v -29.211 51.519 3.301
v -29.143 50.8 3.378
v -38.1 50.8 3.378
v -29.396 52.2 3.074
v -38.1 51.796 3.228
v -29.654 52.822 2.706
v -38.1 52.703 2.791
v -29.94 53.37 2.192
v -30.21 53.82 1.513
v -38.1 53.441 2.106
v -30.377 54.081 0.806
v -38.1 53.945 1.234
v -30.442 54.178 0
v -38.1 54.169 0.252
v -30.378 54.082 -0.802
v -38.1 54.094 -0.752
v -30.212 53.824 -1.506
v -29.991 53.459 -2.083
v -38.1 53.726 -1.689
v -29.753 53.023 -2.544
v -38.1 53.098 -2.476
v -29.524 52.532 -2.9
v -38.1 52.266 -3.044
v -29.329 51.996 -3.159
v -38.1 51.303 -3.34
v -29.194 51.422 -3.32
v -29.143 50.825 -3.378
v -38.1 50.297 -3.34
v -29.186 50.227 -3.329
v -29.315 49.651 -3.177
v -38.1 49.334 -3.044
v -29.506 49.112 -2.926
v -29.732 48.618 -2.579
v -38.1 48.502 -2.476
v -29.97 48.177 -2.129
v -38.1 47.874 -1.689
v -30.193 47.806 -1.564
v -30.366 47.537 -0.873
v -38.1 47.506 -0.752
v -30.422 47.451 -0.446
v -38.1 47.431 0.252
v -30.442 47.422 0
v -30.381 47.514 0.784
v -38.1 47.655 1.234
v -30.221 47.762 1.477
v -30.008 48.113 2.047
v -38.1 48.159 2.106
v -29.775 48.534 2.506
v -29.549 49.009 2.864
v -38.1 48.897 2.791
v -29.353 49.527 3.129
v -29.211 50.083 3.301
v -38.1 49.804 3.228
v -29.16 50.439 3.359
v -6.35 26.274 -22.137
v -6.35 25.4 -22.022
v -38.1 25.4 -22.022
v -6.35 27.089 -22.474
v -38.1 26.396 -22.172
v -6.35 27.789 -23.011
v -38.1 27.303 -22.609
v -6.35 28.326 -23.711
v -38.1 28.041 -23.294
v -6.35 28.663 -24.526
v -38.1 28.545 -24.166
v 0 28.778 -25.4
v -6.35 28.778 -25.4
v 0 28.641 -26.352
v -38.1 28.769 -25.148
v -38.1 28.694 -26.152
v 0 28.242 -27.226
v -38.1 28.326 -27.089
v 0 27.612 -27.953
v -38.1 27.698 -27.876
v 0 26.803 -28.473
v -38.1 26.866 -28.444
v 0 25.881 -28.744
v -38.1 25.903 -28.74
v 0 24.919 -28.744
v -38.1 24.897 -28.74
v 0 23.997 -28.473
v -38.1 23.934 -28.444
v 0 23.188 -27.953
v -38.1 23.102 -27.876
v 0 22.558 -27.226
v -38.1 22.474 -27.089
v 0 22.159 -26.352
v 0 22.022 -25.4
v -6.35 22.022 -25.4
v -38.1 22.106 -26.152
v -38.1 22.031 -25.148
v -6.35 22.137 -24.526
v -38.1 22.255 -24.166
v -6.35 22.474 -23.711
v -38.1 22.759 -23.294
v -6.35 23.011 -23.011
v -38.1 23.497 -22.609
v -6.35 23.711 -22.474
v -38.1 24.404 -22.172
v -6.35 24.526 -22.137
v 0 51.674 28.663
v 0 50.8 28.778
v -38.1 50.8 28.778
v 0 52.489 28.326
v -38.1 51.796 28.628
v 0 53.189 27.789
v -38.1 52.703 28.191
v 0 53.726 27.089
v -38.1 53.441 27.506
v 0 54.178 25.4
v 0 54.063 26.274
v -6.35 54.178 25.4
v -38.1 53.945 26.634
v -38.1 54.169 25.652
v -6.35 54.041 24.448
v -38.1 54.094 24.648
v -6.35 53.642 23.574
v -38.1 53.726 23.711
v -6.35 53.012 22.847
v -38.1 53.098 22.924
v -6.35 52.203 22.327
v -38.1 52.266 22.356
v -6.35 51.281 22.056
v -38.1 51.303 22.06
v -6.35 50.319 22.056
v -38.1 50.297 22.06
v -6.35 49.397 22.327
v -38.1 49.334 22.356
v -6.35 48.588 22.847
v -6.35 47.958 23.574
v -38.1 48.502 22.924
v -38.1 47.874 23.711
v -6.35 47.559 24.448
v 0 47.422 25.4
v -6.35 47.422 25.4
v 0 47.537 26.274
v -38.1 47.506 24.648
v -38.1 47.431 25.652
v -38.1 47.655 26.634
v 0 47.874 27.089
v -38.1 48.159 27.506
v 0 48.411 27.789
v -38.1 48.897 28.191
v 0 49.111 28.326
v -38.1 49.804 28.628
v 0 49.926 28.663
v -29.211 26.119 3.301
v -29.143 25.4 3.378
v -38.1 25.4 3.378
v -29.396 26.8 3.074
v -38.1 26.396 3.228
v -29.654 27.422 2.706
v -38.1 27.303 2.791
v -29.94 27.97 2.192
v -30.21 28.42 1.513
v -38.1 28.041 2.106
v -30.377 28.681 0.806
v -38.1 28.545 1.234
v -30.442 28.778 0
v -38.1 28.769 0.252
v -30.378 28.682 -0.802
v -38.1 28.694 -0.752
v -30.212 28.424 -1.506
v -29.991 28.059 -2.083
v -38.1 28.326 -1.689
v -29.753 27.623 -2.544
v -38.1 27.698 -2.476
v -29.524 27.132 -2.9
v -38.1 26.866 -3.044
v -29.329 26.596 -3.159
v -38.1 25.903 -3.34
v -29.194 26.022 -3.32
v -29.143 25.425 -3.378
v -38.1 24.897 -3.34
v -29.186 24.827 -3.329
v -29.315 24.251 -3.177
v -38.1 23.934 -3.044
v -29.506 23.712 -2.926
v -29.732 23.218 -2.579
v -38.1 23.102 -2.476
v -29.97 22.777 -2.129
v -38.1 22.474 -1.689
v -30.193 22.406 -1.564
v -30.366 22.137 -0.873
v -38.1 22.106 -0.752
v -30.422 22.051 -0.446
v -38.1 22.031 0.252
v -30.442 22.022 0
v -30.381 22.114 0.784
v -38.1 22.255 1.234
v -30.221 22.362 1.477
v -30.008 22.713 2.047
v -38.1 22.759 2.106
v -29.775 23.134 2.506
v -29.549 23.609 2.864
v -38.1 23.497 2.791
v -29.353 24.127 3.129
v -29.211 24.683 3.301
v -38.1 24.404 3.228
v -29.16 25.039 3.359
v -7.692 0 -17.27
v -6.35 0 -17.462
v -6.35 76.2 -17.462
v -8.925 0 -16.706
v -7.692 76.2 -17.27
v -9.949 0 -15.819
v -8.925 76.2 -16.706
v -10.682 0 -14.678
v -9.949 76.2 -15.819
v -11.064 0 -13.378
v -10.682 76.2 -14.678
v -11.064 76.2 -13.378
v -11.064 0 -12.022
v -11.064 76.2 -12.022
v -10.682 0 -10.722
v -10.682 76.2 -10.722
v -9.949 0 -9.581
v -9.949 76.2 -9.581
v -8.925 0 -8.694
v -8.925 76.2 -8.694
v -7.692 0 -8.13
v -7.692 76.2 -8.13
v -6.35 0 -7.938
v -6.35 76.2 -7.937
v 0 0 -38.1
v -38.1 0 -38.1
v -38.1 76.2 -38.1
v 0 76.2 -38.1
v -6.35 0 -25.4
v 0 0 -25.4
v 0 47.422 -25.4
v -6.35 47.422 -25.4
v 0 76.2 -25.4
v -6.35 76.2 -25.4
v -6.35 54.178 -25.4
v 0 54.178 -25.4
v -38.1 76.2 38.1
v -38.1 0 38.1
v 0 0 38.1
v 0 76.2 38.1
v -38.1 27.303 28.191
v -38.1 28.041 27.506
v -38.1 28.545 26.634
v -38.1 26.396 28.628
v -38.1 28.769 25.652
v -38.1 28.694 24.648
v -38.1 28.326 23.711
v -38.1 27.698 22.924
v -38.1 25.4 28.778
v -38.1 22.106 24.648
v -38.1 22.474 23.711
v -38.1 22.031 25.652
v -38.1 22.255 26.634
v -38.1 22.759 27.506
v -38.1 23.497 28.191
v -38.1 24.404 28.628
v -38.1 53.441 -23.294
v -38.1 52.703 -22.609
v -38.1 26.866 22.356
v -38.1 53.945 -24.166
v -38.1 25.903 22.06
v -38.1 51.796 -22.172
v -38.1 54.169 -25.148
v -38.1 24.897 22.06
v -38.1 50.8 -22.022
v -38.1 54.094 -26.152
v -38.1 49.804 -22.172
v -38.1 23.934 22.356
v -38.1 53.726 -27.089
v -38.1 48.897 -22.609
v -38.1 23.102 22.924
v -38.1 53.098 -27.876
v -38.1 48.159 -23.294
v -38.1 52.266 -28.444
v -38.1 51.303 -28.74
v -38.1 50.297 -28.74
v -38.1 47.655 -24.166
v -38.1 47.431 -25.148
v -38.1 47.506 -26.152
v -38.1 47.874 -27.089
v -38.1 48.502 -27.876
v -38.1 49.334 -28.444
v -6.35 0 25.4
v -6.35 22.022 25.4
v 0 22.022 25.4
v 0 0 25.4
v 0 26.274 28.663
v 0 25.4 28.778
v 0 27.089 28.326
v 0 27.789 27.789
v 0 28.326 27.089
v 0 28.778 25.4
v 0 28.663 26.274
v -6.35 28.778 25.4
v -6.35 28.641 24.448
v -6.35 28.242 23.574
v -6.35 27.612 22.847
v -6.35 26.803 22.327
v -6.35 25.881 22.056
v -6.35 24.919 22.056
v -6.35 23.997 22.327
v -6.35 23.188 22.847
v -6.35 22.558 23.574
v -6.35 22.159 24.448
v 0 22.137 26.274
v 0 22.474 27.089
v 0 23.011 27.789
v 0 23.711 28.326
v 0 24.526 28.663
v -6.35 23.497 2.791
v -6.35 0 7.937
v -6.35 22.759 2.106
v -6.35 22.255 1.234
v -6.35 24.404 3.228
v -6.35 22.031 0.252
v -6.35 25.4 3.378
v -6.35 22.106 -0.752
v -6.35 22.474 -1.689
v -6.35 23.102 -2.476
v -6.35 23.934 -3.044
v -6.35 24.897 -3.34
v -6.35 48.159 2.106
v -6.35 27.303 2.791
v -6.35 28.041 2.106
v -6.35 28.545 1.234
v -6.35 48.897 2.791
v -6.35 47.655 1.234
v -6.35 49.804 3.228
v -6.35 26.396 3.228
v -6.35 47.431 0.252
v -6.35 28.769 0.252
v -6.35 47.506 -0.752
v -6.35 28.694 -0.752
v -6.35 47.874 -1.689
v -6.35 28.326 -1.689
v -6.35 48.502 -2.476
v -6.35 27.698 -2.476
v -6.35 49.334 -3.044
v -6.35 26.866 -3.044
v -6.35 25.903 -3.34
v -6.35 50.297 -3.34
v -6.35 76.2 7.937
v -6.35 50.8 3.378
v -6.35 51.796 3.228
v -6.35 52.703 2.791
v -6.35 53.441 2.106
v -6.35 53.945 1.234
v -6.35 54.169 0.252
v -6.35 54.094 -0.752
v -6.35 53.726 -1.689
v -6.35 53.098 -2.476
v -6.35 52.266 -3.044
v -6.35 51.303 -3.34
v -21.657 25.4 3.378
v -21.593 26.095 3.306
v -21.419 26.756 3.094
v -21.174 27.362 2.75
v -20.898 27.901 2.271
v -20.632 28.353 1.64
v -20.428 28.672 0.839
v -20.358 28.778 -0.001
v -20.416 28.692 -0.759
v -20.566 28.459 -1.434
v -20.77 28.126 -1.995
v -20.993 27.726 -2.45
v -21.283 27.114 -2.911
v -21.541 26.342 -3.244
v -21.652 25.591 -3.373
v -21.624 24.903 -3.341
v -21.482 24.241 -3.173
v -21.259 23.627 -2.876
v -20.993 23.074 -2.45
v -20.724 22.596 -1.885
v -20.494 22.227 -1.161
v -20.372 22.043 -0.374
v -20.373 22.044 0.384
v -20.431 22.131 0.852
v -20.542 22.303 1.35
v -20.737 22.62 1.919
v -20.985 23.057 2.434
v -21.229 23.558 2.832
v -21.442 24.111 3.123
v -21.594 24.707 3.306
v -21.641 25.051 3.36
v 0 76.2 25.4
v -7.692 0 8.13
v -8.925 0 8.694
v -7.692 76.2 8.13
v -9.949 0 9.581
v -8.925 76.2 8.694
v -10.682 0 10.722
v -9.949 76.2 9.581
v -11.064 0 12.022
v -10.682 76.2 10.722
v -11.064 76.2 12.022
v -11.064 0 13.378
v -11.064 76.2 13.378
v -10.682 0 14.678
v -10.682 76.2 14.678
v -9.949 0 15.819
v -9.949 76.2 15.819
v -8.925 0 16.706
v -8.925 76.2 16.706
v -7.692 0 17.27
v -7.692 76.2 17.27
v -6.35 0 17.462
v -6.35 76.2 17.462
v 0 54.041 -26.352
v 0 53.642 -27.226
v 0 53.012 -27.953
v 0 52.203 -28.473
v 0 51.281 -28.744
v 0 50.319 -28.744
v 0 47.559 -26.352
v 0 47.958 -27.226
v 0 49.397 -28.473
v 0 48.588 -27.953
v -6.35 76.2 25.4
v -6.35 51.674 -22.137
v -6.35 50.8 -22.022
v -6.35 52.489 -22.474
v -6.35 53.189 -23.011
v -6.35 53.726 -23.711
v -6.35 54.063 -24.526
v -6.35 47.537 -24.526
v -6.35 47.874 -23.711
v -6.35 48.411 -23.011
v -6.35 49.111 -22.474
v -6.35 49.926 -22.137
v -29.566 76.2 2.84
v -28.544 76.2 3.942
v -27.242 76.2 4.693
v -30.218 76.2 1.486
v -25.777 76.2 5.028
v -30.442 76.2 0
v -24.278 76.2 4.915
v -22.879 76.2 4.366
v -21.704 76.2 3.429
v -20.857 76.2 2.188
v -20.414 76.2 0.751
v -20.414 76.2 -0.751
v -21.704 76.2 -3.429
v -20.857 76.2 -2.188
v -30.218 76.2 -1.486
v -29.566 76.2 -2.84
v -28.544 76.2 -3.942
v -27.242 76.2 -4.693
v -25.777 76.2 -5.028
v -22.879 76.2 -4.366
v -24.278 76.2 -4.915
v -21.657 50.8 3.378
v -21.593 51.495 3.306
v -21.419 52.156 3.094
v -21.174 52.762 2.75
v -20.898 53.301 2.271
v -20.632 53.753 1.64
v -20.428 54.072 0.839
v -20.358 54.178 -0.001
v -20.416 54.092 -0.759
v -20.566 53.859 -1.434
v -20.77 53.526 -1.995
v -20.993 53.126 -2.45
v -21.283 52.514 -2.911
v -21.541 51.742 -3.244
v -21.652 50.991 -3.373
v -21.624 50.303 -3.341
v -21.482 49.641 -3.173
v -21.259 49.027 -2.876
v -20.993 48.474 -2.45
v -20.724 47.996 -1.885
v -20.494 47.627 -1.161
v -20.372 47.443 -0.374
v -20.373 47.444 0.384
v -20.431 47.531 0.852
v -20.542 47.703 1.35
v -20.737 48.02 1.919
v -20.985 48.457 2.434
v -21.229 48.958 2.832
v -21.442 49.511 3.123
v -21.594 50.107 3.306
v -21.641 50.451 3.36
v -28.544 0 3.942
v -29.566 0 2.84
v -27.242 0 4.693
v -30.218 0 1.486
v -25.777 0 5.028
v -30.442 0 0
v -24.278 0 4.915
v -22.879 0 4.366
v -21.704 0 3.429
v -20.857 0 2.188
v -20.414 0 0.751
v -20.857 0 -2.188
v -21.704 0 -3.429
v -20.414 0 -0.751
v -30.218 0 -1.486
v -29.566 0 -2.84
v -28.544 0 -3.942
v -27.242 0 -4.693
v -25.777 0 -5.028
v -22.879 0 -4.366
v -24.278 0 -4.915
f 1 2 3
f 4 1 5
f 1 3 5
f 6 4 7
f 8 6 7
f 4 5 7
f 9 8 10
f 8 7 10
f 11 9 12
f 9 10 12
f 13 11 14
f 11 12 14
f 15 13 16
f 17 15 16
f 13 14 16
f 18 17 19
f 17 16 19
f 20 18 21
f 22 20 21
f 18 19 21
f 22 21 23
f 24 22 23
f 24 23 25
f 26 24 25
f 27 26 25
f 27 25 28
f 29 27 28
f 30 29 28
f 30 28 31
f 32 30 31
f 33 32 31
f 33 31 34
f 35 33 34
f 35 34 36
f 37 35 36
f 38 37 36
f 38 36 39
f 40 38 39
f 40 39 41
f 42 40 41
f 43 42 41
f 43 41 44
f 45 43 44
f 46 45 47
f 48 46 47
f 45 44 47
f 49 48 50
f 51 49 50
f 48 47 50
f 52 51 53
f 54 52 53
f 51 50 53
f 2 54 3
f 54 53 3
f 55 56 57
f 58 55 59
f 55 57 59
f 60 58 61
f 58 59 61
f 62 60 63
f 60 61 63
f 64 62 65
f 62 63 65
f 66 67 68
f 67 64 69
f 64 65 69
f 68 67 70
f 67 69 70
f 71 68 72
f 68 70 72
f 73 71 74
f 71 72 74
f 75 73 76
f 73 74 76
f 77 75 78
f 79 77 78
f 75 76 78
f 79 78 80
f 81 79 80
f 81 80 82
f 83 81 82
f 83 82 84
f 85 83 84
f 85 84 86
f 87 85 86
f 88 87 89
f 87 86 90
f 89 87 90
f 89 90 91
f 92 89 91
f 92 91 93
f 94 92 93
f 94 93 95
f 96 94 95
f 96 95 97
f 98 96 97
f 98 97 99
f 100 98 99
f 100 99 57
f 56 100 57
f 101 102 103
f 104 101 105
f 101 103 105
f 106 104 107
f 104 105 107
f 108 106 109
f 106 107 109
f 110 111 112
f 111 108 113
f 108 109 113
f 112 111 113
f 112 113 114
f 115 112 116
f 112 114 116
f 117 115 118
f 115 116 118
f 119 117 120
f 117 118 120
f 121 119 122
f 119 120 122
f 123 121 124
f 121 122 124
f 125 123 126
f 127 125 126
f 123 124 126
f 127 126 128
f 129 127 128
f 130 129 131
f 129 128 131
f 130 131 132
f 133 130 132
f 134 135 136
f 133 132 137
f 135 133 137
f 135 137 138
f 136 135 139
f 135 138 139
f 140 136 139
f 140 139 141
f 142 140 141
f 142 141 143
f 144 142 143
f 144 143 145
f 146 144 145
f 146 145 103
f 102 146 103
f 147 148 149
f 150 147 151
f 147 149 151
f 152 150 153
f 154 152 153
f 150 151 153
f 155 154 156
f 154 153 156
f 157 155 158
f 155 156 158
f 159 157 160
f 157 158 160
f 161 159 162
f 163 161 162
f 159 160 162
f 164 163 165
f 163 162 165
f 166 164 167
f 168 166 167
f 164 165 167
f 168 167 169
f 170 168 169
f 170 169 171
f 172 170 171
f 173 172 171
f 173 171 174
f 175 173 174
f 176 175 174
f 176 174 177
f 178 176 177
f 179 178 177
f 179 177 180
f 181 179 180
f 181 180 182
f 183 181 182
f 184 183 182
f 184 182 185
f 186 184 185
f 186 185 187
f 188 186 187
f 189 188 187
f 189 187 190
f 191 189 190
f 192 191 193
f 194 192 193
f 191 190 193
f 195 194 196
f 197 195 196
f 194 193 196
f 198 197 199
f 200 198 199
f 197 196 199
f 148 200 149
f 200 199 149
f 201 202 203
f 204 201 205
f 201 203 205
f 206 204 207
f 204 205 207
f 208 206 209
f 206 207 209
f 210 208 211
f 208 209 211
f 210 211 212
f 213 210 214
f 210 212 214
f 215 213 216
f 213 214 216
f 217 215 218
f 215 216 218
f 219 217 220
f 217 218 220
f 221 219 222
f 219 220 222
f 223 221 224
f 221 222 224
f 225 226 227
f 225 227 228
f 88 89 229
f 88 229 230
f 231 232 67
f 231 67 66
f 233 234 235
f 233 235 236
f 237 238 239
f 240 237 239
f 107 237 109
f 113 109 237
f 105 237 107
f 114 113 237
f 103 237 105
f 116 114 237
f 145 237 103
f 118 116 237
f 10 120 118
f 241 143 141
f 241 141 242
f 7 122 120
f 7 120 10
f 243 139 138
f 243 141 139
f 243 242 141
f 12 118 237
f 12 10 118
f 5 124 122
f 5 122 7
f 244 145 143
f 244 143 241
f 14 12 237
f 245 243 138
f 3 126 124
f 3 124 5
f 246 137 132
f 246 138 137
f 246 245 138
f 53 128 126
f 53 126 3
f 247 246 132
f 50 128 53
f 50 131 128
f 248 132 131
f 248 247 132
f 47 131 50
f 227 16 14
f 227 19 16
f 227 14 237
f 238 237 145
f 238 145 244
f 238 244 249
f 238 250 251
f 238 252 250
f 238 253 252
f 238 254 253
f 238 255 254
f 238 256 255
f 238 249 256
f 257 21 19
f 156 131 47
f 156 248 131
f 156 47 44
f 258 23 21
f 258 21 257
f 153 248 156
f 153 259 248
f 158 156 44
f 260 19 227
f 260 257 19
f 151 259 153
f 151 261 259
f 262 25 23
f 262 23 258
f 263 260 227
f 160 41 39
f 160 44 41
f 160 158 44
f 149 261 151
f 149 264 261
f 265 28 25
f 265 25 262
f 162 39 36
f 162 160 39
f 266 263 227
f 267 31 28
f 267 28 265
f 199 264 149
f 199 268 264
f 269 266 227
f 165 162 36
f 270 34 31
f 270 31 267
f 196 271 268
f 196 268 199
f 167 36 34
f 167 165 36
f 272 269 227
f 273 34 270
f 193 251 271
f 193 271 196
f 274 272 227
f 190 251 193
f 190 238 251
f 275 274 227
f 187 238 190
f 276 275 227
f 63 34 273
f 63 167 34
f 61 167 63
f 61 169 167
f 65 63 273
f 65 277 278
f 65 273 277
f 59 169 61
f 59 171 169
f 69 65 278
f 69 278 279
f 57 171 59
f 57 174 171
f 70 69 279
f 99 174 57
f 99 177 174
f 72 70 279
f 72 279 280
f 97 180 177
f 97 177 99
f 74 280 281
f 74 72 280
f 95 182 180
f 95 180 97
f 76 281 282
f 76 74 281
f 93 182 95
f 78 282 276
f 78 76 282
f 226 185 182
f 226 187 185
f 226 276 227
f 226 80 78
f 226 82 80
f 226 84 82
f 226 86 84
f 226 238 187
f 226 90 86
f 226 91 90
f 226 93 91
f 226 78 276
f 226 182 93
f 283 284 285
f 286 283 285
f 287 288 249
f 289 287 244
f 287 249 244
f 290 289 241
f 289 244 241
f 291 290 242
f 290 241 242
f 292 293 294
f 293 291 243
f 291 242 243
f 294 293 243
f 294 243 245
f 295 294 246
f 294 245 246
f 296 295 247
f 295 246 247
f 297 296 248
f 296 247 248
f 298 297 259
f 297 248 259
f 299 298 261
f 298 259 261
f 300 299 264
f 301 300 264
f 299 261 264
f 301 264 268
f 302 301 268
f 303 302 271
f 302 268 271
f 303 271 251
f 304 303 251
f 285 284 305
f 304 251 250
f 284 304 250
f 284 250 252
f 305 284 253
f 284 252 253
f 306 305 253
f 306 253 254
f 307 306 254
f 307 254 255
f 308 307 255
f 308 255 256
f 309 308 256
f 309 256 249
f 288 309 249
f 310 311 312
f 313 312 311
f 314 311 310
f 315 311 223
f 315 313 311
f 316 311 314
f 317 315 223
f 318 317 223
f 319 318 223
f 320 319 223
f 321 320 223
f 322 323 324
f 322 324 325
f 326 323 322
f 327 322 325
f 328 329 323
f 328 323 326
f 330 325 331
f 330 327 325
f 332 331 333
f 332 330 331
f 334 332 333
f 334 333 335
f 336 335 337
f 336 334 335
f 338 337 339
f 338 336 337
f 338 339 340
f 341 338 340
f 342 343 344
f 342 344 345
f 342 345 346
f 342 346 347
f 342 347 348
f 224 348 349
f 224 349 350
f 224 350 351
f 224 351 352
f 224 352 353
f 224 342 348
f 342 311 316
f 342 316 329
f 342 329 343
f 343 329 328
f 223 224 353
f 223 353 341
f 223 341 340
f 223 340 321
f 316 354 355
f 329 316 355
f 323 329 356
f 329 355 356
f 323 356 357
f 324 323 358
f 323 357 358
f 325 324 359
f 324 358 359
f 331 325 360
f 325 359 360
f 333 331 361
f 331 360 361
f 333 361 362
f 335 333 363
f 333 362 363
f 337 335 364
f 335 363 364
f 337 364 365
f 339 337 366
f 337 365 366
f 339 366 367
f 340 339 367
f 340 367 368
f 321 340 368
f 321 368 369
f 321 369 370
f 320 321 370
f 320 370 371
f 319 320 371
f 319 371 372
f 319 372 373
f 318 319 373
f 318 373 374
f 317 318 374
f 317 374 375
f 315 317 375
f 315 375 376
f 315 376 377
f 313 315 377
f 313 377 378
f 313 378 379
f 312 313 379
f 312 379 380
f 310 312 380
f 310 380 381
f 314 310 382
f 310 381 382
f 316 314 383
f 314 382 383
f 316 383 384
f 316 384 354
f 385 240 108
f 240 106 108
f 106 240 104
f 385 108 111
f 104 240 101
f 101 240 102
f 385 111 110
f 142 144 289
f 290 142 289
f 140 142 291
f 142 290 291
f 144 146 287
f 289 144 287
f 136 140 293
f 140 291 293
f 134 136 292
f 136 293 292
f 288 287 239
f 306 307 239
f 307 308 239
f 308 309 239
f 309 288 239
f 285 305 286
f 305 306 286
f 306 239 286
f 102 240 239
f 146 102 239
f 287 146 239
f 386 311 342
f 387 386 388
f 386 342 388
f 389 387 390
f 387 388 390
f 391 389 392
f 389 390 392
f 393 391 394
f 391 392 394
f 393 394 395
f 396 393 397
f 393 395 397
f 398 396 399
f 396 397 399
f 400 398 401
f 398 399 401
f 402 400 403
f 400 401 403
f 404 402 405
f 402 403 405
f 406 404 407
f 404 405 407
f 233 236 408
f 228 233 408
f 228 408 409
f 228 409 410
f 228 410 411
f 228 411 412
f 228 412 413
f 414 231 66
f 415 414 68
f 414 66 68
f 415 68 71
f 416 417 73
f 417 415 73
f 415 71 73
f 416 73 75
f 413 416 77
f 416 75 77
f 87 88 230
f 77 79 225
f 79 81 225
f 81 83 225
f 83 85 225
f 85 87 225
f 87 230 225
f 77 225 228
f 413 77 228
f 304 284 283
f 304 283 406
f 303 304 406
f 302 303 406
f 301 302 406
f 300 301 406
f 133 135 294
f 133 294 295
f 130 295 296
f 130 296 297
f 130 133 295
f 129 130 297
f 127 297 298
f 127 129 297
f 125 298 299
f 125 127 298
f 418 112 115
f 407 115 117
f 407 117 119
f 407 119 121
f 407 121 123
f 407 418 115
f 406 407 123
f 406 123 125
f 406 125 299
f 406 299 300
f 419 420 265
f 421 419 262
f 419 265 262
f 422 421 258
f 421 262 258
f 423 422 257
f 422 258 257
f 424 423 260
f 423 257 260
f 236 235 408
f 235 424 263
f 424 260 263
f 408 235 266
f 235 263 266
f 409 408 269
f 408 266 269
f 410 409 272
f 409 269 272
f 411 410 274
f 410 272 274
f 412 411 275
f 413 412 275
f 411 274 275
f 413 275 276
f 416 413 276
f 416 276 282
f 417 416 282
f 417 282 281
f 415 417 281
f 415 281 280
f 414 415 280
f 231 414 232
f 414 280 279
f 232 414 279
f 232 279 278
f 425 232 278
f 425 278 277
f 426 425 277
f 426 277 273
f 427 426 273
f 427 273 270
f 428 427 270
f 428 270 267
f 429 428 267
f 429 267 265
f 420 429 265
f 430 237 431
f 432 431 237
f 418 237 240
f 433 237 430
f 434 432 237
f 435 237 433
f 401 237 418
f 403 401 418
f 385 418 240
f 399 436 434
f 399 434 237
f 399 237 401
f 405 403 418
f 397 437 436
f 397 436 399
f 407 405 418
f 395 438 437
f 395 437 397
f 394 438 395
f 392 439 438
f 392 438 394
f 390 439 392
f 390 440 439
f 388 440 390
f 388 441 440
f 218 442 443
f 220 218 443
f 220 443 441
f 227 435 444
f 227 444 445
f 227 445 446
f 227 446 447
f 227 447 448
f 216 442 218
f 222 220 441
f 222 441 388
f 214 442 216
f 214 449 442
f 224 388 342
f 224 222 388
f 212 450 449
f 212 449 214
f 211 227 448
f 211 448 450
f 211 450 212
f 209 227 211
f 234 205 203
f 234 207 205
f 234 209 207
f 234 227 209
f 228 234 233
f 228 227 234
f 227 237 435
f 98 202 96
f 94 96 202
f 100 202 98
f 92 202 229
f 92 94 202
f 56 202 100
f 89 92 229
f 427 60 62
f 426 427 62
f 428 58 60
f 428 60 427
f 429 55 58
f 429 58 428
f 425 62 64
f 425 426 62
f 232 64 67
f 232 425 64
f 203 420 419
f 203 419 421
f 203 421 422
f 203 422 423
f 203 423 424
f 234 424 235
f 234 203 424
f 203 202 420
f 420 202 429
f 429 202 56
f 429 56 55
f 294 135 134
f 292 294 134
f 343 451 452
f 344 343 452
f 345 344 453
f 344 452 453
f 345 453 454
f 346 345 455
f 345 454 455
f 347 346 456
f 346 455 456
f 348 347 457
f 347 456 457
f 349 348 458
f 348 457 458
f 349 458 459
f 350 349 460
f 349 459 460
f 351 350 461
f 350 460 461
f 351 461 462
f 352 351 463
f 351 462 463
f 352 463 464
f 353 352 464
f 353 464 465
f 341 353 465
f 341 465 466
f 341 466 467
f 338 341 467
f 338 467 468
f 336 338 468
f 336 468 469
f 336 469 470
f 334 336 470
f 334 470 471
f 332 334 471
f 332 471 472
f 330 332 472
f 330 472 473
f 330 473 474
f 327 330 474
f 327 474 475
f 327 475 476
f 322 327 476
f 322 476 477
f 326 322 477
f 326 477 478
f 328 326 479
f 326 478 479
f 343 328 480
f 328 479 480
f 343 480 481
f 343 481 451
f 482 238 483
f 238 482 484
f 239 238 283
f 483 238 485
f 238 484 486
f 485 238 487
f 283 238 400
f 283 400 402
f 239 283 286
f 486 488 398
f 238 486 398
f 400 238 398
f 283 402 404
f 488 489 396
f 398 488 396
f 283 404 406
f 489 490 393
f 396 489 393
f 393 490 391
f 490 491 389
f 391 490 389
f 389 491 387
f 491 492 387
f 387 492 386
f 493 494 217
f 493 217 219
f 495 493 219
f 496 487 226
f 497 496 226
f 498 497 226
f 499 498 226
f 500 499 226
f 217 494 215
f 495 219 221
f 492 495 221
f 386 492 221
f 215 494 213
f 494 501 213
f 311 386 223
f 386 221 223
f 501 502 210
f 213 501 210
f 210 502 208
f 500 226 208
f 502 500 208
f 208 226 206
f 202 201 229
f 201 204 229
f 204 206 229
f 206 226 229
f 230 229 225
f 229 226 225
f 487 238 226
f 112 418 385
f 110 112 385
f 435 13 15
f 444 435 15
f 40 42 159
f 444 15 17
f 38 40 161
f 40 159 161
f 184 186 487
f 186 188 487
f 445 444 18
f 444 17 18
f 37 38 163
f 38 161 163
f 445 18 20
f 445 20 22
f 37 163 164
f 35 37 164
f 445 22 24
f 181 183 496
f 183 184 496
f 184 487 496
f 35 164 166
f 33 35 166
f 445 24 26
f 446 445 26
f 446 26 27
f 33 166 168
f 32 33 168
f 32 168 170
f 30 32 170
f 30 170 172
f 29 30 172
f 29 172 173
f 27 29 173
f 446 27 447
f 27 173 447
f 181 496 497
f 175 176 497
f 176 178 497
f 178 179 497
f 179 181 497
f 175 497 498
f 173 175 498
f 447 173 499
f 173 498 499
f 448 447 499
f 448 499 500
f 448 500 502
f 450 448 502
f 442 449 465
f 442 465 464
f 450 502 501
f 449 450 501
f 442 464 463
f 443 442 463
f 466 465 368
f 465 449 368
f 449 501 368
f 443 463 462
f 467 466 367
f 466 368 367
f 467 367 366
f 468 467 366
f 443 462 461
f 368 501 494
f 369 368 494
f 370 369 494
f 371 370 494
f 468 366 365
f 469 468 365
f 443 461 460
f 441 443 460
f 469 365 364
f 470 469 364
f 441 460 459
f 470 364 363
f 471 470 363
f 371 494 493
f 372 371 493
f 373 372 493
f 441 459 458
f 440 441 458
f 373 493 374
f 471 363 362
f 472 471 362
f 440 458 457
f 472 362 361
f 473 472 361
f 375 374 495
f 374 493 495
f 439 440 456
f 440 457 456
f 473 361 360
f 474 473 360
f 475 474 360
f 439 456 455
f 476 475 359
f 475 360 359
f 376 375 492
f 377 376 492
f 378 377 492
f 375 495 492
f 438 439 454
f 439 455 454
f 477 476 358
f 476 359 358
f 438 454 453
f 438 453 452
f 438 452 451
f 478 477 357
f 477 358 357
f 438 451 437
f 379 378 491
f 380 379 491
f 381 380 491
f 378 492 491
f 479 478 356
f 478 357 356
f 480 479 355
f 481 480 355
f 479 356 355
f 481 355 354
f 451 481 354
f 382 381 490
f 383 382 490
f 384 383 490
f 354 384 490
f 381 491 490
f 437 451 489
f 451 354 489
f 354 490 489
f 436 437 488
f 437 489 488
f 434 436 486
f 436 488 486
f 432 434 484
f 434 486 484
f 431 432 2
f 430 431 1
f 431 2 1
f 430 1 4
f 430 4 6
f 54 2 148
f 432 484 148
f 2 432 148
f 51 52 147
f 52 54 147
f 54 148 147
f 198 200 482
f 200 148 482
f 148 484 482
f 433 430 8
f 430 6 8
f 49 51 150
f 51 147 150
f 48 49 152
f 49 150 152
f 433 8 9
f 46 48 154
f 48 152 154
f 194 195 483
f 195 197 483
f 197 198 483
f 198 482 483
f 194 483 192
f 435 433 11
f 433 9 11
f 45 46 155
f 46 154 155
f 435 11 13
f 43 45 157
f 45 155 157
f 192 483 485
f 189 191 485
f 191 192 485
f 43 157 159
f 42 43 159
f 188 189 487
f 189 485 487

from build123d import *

# Parameters (mm, degrees)
SKETCH1_W               = 38.1
SKETCH1_H               = 76.2
BOSS_EXTRUDE1_DEPTH     = 76.2
SKETCH2_W               = 6.35
SKETCH2_H               = 50.8
CUT_EXTRUDE1_DEPTH      = 94.3255592
F_1_4_CLEARANCE_HOLE1_D = 6.7564
F_3_8_CLEARANCE_HOLE1_D = 10.0838
SKETCH7_R               = 4.7625
CUT_EXTRUDE2_DEPTH      = 94.325559323


with BuildPart() as part:
    # Sketch1 → Boss-Extrude1 (new body)
    with BuildSketch(Plane(origin=(0, 0, 0), x_dir=(1, 0, 0), z_dir=(0, 1, 0))):
        with Locations((-19.05, 0)):
            Rectangle(SKETCH1_W, SKETCH1_H)
    extrude(amount=BOSS_EXTRUDE1_DEPTH)

    # Sketch2 → Cut-Extrude1 (cut, through all)
    with BuildSketch(Plane(origin=(0, 76.2, 0), x_dir=(1, 0, 0), z_dir=(0, 1, 0))):
        with Locations((-3.175, 0)):
            Rectangle(SKETCH2_W, SKETCH2_H)
    extrude(amount=-CUT_EXTRUDE1_DEPTH, mode=Mode.SUBTRACT)

    # 1/4 Clearance Hole1 (through all)
    with Locations(Plane(origin=(0, 0, 0), x_dir=(0, 0, -1), z_dir=(1, 0, 0))):
        with Locations((0, 50.8), (0, 25.4), (-25.4, 25.4), (-25.4, 50.8), (25.4, 50.8), (25.4, 25.4)):
            Hole(F_1_4_CLEARANCE_HOLE1_D / 2)

    # 3/8 Clearance Hole1 (through all)
    with Locations(Plane(origin=(0, 76.2, 0), x_dir=(1, 0, 0), z_dir=(0, 1, 0))):
        with Locations((-25.4, 0)):
            Hole(F_3_8_CLEARANCE_HOLE1_D / 2)

    # Sketch7 → Cut-Extrude2 (cut, through all)
    with BuildSketch(Plane(origin=(0, 76.2, 0), x_dir=(1, 0, 0), z_dir=(0, 1, 0))):
        with Locations((-6.35, 12.7)):
            Circle(SKETCH7_R)
        with Locations((-6.35, -12.7)):
            Circle(SKETCH7_R)
    extrude(amount=-CUT_EXTRUDE2_DEPTH, mode=Mode.SUBTRACT)


solid = part.part
